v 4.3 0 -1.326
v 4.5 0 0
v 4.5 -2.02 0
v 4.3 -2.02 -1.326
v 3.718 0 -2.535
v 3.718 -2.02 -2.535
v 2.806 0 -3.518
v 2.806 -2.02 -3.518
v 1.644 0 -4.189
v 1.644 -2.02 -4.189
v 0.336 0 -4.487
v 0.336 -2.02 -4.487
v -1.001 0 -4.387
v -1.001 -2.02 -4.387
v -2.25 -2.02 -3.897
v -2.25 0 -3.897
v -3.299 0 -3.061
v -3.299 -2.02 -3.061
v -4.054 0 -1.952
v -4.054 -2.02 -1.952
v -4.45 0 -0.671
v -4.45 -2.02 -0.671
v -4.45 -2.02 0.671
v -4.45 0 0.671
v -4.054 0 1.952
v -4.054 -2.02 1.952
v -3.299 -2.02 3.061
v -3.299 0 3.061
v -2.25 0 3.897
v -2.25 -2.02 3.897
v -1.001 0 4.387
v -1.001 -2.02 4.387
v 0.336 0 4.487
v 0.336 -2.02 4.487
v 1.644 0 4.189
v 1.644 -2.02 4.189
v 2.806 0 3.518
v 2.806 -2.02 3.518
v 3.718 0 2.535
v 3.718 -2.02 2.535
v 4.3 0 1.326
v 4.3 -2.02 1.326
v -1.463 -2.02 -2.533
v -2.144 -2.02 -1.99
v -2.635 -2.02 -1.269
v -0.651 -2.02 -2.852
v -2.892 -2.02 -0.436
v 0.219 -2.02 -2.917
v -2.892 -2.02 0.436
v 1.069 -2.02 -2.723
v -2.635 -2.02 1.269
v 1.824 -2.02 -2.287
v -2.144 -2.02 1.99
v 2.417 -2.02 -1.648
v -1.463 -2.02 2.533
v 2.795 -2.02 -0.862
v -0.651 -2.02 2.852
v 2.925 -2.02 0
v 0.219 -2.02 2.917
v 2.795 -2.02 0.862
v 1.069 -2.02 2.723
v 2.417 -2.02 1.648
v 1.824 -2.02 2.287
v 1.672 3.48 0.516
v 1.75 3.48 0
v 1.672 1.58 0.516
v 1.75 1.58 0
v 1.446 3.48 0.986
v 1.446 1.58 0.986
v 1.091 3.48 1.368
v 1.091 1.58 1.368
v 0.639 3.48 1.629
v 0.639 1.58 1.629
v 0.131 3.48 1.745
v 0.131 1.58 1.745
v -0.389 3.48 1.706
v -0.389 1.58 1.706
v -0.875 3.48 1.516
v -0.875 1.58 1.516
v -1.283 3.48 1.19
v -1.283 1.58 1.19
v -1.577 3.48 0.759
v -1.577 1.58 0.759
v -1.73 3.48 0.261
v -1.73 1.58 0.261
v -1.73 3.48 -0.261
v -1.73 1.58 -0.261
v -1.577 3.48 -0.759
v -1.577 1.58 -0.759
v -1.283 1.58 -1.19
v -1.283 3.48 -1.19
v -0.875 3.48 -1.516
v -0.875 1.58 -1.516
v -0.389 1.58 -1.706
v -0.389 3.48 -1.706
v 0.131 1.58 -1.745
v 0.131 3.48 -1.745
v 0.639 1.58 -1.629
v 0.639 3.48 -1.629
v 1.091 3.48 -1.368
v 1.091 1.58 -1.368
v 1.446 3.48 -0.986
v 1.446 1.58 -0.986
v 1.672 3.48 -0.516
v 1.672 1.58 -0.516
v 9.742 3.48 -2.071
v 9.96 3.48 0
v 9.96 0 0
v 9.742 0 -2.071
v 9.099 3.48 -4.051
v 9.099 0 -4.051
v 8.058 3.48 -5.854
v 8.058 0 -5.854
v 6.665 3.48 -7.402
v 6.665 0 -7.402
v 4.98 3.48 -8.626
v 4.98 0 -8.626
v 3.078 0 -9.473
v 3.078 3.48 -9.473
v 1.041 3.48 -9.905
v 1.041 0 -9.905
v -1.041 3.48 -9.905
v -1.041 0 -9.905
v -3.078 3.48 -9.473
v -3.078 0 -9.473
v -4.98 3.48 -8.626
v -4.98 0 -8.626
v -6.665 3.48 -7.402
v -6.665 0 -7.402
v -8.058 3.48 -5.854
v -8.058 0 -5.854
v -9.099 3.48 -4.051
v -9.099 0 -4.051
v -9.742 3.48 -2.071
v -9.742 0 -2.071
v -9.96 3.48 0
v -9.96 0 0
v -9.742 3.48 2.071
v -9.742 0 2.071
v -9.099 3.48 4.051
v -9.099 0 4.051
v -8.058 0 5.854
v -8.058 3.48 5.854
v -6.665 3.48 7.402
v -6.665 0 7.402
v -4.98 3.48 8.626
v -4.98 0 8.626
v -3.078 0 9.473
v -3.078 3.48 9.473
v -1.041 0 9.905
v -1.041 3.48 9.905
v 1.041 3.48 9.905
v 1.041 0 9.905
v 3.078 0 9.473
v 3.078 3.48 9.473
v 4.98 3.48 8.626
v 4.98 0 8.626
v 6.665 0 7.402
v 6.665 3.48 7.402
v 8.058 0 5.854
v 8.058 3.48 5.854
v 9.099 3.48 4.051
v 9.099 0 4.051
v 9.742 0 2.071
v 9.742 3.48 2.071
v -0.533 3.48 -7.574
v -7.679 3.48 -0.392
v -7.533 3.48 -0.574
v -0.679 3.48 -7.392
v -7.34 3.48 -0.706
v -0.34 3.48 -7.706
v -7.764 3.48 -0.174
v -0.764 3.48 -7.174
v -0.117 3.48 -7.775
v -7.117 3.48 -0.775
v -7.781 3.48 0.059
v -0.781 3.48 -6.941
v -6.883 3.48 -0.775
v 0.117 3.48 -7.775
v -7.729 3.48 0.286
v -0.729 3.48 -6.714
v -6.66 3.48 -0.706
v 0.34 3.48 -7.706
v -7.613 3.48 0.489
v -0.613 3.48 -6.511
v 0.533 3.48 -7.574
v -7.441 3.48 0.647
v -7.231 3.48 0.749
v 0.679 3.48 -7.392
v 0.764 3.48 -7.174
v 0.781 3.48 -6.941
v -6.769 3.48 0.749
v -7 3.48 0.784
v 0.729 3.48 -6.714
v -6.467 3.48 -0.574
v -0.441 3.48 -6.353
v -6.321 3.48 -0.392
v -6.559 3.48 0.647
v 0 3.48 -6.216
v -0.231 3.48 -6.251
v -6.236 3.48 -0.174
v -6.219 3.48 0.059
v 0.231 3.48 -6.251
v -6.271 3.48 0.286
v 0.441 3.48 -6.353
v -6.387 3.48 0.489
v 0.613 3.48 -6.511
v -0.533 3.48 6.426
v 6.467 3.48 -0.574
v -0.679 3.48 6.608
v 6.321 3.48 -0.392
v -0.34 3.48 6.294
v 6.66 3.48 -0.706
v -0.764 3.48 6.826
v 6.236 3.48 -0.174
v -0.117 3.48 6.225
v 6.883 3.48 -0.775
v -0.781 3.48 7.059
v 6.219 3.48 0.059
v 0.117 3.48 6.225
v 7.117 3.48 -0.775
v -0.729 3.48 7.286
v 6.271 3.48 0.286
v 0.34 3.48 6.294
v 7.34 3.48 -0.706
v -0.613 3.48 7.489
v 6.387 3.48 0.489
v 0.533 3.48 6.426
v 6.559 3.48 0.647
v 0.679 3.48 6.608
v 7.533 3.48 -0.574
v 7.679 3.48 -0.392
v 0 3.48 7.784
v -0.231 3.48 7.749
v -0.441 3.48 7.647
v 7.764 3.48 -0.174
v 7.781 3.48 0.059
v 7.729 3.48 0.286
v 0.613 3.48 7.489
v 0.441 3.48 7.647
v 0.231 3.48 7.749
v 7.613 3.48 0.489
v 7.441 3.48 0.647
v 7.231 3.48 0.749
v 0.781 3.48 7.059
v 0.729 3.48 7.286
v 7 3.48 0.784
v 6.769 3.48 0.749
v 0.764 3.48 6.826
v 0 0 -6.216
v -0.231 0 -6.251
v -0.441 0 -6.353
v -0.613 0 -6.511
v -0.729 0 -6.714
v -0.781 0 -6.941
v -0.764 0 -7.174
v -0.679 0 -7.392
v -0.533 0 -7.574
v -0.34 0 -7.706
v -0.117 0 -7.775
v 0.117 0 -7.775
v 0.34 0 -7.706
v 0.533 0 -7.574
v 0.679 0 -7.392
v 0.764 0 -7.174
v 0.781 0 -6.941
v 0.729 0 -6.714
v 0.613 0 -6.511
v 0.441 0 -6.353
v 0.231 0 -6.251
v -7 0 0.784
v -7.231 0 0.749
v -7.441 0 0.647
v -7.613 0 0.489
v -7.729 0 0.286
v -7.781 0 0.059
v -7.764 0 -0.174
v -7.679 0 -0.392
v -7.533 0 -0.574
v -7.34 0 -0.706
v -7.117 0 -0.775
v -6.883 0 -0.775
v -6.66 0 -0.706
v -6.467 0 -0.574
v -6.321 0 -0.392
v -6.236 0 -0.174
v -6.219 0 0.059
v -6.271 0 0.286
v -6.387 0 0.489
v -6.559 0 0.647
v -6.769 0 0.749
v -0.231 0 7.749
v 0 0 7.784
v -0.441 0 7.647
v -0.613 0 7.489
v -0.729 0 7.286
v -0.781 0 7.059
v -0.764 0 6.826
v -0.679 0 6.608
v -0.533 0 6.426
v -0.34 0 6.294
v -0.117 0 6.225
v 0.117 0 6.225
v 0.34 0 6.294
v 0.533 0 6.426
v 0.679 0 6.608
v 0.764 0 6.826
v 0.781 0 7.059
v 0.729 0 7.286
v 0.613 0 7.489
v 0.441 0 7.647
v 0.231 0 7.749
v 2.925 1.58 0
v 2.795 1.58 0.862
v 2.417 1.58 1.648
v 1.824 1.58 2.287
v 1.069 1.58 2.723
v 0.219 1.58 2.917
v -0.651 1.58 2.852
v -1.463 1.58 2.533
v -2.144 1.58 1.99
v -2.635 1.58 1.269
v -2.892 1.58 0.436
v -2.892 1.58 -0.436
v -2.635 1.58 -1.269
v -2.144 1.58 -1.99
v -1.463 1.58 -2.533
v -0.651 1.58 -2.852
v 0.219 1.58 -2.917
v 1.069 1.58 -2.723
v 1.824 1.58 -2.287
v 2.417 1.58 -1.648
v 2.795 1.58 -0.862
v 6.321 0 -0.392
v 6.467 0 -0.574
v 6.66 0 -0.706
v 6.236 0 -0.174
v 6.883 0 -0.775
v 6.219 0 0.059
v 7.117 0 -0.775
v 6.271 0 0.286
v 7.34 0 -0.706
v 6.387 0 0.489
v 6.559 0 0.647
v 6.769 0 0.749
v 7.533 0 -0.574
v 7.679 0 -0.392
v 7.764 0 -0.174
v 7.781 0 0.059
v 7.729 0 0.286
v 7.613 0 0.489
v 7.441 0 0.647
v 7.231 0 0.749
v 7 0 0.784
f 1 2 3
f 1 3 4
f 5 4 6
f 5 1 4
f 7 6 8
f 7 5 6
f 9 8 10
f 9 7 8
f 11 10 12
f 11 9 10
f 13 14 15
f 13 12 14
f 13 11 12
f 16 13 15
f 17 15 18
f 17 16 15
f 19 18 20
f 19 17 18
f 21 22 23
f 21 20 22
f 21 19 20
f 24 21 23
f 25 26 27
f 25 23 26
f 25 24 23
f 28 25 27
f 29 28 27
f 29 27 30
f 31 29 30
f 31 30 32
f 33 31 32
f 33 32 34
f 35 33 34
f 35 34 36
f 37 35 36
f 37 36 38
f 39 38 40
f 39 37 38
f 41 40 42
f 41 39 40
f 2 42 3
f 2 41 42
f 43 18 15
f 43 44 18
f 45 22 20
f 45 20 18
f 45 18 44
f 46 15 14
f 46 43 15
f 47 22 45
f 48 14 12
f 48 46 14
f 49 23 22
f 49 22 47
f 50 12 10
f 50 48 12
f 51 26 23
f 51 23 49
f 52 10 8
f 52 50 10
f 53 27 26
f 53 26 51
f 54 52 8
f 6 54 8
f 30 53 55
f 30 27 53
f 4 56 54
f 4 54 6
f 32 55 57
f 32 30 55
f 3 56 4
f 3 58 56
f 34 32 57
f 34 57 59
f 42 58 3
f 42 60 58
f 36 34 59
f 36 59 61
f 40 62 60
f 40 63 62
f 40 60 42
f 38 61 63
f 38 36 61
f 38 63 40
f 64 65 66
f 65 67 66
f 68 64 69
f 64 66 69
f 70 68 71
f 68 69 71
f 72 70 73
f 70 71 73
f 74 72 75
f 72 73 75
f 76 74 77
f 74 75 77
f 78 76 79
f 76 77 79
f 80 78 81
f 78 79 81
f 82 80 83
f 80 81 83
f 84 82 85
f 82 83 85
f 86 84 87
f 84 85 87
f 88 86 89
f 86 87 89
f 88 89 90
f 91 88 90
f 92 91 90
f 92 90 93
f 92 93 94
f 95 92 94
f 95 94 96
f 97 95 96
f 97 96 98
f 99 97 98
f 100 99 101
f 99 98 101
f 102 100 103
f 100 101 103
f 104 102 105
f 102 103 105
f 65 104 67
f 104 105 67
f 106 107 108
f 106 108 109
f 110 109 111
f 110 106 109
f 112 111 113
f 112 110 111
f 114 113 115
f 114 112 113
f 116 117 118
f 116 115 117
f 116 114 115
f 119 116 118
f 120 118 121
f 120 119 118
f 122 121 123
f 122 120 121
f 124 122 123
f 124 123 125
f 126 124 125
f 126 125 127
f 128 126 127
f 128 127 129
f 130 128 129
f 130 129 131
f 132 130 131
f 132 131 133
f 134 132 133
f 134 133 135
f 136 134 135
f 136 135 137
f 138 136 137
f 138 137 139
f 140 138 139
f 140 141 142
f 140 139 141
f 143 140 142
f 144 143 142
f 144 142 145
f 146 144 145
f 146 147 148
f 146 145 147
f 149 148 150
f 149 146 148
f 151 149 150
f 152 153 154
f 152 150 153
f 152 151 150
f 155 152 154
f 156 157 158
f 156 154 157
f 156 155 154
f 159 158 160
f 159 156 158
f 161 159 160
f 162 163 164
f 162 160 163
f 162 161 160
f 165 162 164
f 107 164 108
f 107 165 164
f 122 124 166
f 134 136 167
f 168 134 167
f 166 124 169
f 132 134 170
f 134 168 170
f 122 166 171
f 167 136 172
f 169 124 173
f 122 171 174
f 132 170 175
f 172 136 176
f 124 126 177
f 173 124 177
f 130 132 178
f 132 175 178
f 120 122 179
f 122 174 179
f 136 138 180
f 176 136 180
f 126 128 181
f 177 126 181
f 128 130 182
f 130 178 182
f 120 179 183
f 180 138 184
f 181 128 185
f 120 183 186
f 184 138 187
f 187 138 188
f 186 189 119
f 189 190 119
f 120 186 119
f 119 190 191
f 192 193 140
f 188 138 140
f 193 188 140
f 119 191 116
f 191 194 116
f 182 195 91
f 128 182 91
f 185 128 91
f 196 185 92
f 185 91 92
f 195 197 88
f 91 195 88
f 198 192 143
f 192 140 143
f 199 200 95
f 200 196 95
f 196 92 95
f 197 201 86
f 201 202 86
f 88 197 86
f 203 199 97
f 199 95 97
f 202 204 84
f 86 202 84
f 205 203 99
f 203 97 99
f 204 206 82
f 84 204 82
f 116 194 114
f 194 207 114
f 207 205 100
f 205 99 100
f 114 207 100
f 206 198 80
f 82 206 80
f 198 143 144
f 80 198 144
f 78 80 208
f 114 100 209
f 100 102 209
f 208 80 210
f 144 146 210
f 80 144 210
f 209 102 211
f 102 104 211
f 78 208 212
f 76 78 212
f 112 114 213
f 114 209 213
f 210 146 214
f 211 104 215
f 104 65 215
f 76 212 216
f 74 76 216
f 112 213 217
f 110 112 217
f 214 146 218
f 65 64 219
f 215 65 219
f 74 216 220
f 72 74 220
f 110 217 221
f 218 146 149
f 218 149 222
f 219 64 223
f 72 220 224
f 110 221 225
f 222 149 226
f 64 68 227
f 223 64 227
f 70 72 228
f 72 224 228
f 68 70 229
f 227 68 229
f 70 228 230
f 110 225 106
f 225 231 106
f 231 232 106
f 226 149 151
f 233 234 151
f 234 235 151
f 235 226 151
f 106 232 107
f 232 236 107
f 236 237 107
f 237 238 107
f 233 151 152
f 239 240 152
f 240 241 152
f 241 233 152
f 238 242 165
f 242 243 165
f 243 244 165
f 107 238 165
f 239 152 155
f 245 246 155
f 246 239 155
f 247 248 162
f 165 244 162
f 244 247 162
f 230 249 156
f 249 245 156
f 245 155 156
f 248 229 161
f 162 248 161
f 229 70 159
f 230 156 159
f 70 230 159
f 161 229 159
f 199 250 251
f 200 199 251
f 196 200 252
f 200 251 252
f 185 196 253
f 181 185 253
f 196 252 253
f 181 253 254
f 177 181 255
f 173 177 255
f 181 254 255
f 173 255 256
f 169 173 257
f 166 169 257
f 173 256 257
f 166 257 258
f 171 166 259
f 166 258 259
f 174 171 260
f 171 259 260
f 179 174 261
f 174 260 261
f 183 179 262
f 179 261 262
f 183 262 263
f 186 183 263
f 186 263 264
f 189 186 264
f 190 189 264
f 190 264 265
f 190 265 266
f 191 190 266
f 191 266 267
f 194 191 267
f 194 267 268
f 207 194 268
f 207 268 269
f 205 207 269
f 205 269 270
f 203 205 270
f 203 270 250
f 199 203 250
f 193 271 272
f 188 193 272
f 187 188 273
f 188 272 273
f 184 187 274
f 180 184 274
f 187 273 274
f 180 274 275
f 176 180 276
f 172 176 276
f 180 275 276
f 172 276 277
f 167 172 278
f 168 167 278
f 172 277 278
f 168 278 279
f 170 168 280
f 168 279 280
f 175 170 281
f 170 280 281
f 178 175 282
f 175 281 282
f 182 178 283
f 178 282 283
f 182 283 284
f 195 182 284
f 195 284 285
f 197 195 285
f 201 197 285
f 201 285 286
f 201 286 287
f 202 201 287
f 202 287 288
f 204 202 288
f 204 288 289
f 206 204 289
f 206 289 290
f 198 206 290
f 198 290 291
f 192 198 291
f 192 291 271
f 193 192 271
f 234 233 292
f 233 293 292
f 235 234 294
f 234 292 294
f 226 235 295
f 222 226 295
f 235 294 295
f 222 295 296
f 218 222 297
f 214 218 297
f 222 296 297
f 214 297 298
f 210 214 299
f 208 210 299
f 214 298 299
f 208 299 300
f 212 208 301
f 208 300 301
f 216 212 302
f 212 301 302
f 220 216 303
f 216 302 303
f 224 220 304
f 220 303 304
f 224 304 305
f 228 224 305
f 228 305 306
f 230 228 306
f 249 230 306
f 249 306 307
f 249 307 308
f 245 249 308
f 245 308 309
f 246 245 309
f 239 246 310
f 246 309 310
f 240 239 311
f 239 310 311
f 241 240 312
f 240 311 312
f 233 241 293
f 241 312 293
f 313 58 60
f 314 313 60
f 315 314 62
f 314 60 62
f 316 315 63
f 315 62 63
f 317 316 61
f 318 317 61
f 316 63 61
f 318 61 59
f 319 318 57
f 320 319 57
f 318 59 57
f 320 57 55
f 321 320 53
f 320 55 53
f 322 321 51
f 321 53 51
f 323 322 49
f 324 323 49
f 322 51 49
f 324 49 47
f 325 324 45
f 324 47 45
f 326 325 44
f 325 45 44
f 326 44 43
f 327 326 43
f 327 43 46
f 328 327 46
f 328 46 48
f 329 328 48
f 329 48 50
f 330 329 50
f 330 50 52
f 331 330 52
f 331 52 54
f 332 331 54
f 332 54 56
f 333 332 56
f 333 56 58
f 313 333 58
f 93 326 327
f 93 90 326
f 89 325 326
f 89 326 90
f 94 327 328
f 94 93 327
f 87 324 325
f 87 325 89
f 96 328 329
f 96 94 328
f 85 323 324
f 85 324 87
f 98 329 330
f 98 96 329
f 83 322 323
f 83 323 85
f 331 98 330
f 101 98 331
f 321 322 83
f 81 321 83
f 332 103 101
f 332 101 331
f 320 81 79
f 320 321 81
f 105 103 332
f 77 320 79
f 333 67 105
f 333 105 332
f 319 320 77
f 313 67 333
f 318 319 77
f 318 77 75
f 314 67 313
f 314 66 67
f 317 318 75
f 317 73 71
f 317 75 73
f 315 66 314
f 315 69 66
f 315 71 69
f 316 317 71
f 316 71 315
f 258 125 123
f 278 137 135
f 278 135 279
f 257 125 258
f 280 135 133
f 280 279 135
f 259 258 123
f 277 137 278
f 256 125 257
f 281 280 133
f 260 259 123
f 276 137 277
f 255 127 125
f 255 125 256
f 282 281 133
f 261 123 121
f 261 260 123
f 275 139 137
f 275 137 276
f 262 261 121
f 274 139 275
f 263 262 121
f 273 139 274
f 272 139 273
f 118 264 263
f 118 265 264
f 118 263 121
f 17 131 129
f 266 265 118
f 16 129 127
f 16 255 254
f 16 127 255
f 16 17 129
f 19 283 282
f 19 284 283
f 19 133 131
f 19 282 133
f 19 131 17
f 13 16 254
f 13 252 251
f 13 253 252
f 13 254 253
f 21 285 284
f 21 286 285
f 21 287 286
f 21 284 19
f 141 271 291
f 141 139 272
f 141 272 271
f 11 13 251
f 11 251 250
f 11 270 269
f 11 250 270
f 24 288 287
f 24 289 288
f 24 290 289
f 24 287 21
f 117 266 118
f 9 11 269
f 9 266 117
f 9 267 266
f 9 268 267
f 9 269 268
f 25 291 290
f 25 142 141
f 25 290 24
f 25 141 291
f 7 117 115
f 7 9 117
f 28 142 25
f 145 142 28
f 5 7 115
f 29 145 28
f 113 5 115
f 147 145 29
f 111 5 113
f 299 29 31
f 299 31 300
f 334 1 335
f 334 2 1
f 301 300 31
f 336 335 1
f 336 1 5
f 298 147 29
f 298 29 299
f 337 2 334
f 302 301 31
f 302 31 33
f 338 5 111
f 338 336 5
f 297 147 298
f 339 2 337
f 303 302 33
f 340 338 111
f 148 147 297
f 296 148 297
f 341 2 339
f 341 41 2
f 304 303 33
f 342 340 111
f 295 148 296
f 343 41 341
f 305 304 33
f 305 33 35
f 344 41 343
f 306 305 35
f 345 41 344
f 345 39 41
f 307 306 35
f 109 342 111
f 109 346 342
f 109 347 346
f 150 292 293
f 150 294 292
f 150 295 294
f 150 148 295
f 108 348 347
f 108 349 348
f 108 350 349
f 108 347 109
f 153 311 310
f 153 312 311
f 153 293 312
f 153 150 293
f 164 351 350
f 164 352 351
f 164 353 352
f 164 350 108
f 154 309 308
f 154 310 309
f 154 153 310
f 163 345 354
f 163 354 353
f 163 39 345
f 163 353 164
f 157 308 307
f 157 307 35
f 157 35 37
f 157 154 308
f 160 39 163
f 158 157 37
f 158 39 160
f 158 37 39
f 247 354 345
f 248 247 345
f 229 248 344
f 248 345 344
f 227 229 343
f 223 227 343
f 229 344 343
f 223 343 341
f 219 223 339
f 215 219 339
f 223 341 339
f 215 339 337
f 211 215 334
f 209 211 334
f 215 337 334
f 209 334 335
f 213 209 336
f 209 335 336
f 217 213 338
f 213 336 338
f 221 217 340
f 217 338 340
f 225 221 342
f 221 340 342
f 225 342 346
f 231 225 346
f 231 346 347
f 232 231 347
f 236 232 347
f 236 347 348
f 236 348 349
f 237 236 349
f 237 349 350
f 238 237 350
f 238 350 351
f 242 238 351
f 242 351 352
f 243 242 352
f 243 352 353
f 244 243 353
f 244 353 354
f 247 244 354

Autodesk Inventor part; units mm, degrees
ref_plane "YZ Plane" through (0, 0, 0) normal (1, 0, 0) x (0, 1, 0)
ref_plane "XZ Plane" through (0, 0, 0) normal (0, 1, 0) x (-1, 0, 0)
ref_plane "XY Plane" through (0, 0, 0) normal (0, 0, 1) x (1, 0, 0)
sketch "스케치1" plane through (0, 0, 0) normal (0, 0, 1) x (1, 0, 0)
  line L0 (0, 3.2752) -> (0, -3.2752)
  line L1 (1.75, 3.48) -> (1.75, 1.58)
  line L2 (1.75, 1.58) -> (2.925, 1.58)
  line L3 (2.925, 1.58) -> (2.925, -2.02)
  line L4 (2.925, -2.02) -> (4.5, -2.02)
  line L5 (4.5, -2.02) -> (4.5, 0)
  line L6 (4.5, 0) -> (9.96, 0)
  line L7 (9.96, 0) -> (9.96, 3.48)
  line L8 (9.96, 3.48) -> (1.75, 3.48)
  point P0 (0, 0)
  point P1 (0, 0)
  dimension "d1" = 1.75
  dimension "d2" = 2.925
  dimension "d4" = 3.48
  dimension "d6" = 4.5
  dimension "d7" = 9.96
  dimension "d8" = 1.9
  dimension "d22" = 5.5
revolve "회전1" add sketch "스케치1" angle 360 about axis through (0, 3.2752, 0) along (0, -1, 0)
sketch "Sketch3" plane through (0, 3.48, 0) normal (0, 1, 0) x (1, 0, 0)
  point P0 (0, 0)
  point P1 (7, 0)
  point P2 (0, 7)
  point P3 (-7, 0)
  point P4 (0, -7)
  dimension "d23" = 7
  dimension "d26" = 360
hole "Hole2" at (7, 3.48, 0) at (0, 3.48, -7) at (-7, 3.48, 0) at (0, 3.48, 7) direction (0, -1, 0) diameter 1.567 end through all thread size "M2x0.4" class "6H" standard "ISO Metric profile"
properties part number "Top Horn Metal" material "Aluminum 6061-AHC"
